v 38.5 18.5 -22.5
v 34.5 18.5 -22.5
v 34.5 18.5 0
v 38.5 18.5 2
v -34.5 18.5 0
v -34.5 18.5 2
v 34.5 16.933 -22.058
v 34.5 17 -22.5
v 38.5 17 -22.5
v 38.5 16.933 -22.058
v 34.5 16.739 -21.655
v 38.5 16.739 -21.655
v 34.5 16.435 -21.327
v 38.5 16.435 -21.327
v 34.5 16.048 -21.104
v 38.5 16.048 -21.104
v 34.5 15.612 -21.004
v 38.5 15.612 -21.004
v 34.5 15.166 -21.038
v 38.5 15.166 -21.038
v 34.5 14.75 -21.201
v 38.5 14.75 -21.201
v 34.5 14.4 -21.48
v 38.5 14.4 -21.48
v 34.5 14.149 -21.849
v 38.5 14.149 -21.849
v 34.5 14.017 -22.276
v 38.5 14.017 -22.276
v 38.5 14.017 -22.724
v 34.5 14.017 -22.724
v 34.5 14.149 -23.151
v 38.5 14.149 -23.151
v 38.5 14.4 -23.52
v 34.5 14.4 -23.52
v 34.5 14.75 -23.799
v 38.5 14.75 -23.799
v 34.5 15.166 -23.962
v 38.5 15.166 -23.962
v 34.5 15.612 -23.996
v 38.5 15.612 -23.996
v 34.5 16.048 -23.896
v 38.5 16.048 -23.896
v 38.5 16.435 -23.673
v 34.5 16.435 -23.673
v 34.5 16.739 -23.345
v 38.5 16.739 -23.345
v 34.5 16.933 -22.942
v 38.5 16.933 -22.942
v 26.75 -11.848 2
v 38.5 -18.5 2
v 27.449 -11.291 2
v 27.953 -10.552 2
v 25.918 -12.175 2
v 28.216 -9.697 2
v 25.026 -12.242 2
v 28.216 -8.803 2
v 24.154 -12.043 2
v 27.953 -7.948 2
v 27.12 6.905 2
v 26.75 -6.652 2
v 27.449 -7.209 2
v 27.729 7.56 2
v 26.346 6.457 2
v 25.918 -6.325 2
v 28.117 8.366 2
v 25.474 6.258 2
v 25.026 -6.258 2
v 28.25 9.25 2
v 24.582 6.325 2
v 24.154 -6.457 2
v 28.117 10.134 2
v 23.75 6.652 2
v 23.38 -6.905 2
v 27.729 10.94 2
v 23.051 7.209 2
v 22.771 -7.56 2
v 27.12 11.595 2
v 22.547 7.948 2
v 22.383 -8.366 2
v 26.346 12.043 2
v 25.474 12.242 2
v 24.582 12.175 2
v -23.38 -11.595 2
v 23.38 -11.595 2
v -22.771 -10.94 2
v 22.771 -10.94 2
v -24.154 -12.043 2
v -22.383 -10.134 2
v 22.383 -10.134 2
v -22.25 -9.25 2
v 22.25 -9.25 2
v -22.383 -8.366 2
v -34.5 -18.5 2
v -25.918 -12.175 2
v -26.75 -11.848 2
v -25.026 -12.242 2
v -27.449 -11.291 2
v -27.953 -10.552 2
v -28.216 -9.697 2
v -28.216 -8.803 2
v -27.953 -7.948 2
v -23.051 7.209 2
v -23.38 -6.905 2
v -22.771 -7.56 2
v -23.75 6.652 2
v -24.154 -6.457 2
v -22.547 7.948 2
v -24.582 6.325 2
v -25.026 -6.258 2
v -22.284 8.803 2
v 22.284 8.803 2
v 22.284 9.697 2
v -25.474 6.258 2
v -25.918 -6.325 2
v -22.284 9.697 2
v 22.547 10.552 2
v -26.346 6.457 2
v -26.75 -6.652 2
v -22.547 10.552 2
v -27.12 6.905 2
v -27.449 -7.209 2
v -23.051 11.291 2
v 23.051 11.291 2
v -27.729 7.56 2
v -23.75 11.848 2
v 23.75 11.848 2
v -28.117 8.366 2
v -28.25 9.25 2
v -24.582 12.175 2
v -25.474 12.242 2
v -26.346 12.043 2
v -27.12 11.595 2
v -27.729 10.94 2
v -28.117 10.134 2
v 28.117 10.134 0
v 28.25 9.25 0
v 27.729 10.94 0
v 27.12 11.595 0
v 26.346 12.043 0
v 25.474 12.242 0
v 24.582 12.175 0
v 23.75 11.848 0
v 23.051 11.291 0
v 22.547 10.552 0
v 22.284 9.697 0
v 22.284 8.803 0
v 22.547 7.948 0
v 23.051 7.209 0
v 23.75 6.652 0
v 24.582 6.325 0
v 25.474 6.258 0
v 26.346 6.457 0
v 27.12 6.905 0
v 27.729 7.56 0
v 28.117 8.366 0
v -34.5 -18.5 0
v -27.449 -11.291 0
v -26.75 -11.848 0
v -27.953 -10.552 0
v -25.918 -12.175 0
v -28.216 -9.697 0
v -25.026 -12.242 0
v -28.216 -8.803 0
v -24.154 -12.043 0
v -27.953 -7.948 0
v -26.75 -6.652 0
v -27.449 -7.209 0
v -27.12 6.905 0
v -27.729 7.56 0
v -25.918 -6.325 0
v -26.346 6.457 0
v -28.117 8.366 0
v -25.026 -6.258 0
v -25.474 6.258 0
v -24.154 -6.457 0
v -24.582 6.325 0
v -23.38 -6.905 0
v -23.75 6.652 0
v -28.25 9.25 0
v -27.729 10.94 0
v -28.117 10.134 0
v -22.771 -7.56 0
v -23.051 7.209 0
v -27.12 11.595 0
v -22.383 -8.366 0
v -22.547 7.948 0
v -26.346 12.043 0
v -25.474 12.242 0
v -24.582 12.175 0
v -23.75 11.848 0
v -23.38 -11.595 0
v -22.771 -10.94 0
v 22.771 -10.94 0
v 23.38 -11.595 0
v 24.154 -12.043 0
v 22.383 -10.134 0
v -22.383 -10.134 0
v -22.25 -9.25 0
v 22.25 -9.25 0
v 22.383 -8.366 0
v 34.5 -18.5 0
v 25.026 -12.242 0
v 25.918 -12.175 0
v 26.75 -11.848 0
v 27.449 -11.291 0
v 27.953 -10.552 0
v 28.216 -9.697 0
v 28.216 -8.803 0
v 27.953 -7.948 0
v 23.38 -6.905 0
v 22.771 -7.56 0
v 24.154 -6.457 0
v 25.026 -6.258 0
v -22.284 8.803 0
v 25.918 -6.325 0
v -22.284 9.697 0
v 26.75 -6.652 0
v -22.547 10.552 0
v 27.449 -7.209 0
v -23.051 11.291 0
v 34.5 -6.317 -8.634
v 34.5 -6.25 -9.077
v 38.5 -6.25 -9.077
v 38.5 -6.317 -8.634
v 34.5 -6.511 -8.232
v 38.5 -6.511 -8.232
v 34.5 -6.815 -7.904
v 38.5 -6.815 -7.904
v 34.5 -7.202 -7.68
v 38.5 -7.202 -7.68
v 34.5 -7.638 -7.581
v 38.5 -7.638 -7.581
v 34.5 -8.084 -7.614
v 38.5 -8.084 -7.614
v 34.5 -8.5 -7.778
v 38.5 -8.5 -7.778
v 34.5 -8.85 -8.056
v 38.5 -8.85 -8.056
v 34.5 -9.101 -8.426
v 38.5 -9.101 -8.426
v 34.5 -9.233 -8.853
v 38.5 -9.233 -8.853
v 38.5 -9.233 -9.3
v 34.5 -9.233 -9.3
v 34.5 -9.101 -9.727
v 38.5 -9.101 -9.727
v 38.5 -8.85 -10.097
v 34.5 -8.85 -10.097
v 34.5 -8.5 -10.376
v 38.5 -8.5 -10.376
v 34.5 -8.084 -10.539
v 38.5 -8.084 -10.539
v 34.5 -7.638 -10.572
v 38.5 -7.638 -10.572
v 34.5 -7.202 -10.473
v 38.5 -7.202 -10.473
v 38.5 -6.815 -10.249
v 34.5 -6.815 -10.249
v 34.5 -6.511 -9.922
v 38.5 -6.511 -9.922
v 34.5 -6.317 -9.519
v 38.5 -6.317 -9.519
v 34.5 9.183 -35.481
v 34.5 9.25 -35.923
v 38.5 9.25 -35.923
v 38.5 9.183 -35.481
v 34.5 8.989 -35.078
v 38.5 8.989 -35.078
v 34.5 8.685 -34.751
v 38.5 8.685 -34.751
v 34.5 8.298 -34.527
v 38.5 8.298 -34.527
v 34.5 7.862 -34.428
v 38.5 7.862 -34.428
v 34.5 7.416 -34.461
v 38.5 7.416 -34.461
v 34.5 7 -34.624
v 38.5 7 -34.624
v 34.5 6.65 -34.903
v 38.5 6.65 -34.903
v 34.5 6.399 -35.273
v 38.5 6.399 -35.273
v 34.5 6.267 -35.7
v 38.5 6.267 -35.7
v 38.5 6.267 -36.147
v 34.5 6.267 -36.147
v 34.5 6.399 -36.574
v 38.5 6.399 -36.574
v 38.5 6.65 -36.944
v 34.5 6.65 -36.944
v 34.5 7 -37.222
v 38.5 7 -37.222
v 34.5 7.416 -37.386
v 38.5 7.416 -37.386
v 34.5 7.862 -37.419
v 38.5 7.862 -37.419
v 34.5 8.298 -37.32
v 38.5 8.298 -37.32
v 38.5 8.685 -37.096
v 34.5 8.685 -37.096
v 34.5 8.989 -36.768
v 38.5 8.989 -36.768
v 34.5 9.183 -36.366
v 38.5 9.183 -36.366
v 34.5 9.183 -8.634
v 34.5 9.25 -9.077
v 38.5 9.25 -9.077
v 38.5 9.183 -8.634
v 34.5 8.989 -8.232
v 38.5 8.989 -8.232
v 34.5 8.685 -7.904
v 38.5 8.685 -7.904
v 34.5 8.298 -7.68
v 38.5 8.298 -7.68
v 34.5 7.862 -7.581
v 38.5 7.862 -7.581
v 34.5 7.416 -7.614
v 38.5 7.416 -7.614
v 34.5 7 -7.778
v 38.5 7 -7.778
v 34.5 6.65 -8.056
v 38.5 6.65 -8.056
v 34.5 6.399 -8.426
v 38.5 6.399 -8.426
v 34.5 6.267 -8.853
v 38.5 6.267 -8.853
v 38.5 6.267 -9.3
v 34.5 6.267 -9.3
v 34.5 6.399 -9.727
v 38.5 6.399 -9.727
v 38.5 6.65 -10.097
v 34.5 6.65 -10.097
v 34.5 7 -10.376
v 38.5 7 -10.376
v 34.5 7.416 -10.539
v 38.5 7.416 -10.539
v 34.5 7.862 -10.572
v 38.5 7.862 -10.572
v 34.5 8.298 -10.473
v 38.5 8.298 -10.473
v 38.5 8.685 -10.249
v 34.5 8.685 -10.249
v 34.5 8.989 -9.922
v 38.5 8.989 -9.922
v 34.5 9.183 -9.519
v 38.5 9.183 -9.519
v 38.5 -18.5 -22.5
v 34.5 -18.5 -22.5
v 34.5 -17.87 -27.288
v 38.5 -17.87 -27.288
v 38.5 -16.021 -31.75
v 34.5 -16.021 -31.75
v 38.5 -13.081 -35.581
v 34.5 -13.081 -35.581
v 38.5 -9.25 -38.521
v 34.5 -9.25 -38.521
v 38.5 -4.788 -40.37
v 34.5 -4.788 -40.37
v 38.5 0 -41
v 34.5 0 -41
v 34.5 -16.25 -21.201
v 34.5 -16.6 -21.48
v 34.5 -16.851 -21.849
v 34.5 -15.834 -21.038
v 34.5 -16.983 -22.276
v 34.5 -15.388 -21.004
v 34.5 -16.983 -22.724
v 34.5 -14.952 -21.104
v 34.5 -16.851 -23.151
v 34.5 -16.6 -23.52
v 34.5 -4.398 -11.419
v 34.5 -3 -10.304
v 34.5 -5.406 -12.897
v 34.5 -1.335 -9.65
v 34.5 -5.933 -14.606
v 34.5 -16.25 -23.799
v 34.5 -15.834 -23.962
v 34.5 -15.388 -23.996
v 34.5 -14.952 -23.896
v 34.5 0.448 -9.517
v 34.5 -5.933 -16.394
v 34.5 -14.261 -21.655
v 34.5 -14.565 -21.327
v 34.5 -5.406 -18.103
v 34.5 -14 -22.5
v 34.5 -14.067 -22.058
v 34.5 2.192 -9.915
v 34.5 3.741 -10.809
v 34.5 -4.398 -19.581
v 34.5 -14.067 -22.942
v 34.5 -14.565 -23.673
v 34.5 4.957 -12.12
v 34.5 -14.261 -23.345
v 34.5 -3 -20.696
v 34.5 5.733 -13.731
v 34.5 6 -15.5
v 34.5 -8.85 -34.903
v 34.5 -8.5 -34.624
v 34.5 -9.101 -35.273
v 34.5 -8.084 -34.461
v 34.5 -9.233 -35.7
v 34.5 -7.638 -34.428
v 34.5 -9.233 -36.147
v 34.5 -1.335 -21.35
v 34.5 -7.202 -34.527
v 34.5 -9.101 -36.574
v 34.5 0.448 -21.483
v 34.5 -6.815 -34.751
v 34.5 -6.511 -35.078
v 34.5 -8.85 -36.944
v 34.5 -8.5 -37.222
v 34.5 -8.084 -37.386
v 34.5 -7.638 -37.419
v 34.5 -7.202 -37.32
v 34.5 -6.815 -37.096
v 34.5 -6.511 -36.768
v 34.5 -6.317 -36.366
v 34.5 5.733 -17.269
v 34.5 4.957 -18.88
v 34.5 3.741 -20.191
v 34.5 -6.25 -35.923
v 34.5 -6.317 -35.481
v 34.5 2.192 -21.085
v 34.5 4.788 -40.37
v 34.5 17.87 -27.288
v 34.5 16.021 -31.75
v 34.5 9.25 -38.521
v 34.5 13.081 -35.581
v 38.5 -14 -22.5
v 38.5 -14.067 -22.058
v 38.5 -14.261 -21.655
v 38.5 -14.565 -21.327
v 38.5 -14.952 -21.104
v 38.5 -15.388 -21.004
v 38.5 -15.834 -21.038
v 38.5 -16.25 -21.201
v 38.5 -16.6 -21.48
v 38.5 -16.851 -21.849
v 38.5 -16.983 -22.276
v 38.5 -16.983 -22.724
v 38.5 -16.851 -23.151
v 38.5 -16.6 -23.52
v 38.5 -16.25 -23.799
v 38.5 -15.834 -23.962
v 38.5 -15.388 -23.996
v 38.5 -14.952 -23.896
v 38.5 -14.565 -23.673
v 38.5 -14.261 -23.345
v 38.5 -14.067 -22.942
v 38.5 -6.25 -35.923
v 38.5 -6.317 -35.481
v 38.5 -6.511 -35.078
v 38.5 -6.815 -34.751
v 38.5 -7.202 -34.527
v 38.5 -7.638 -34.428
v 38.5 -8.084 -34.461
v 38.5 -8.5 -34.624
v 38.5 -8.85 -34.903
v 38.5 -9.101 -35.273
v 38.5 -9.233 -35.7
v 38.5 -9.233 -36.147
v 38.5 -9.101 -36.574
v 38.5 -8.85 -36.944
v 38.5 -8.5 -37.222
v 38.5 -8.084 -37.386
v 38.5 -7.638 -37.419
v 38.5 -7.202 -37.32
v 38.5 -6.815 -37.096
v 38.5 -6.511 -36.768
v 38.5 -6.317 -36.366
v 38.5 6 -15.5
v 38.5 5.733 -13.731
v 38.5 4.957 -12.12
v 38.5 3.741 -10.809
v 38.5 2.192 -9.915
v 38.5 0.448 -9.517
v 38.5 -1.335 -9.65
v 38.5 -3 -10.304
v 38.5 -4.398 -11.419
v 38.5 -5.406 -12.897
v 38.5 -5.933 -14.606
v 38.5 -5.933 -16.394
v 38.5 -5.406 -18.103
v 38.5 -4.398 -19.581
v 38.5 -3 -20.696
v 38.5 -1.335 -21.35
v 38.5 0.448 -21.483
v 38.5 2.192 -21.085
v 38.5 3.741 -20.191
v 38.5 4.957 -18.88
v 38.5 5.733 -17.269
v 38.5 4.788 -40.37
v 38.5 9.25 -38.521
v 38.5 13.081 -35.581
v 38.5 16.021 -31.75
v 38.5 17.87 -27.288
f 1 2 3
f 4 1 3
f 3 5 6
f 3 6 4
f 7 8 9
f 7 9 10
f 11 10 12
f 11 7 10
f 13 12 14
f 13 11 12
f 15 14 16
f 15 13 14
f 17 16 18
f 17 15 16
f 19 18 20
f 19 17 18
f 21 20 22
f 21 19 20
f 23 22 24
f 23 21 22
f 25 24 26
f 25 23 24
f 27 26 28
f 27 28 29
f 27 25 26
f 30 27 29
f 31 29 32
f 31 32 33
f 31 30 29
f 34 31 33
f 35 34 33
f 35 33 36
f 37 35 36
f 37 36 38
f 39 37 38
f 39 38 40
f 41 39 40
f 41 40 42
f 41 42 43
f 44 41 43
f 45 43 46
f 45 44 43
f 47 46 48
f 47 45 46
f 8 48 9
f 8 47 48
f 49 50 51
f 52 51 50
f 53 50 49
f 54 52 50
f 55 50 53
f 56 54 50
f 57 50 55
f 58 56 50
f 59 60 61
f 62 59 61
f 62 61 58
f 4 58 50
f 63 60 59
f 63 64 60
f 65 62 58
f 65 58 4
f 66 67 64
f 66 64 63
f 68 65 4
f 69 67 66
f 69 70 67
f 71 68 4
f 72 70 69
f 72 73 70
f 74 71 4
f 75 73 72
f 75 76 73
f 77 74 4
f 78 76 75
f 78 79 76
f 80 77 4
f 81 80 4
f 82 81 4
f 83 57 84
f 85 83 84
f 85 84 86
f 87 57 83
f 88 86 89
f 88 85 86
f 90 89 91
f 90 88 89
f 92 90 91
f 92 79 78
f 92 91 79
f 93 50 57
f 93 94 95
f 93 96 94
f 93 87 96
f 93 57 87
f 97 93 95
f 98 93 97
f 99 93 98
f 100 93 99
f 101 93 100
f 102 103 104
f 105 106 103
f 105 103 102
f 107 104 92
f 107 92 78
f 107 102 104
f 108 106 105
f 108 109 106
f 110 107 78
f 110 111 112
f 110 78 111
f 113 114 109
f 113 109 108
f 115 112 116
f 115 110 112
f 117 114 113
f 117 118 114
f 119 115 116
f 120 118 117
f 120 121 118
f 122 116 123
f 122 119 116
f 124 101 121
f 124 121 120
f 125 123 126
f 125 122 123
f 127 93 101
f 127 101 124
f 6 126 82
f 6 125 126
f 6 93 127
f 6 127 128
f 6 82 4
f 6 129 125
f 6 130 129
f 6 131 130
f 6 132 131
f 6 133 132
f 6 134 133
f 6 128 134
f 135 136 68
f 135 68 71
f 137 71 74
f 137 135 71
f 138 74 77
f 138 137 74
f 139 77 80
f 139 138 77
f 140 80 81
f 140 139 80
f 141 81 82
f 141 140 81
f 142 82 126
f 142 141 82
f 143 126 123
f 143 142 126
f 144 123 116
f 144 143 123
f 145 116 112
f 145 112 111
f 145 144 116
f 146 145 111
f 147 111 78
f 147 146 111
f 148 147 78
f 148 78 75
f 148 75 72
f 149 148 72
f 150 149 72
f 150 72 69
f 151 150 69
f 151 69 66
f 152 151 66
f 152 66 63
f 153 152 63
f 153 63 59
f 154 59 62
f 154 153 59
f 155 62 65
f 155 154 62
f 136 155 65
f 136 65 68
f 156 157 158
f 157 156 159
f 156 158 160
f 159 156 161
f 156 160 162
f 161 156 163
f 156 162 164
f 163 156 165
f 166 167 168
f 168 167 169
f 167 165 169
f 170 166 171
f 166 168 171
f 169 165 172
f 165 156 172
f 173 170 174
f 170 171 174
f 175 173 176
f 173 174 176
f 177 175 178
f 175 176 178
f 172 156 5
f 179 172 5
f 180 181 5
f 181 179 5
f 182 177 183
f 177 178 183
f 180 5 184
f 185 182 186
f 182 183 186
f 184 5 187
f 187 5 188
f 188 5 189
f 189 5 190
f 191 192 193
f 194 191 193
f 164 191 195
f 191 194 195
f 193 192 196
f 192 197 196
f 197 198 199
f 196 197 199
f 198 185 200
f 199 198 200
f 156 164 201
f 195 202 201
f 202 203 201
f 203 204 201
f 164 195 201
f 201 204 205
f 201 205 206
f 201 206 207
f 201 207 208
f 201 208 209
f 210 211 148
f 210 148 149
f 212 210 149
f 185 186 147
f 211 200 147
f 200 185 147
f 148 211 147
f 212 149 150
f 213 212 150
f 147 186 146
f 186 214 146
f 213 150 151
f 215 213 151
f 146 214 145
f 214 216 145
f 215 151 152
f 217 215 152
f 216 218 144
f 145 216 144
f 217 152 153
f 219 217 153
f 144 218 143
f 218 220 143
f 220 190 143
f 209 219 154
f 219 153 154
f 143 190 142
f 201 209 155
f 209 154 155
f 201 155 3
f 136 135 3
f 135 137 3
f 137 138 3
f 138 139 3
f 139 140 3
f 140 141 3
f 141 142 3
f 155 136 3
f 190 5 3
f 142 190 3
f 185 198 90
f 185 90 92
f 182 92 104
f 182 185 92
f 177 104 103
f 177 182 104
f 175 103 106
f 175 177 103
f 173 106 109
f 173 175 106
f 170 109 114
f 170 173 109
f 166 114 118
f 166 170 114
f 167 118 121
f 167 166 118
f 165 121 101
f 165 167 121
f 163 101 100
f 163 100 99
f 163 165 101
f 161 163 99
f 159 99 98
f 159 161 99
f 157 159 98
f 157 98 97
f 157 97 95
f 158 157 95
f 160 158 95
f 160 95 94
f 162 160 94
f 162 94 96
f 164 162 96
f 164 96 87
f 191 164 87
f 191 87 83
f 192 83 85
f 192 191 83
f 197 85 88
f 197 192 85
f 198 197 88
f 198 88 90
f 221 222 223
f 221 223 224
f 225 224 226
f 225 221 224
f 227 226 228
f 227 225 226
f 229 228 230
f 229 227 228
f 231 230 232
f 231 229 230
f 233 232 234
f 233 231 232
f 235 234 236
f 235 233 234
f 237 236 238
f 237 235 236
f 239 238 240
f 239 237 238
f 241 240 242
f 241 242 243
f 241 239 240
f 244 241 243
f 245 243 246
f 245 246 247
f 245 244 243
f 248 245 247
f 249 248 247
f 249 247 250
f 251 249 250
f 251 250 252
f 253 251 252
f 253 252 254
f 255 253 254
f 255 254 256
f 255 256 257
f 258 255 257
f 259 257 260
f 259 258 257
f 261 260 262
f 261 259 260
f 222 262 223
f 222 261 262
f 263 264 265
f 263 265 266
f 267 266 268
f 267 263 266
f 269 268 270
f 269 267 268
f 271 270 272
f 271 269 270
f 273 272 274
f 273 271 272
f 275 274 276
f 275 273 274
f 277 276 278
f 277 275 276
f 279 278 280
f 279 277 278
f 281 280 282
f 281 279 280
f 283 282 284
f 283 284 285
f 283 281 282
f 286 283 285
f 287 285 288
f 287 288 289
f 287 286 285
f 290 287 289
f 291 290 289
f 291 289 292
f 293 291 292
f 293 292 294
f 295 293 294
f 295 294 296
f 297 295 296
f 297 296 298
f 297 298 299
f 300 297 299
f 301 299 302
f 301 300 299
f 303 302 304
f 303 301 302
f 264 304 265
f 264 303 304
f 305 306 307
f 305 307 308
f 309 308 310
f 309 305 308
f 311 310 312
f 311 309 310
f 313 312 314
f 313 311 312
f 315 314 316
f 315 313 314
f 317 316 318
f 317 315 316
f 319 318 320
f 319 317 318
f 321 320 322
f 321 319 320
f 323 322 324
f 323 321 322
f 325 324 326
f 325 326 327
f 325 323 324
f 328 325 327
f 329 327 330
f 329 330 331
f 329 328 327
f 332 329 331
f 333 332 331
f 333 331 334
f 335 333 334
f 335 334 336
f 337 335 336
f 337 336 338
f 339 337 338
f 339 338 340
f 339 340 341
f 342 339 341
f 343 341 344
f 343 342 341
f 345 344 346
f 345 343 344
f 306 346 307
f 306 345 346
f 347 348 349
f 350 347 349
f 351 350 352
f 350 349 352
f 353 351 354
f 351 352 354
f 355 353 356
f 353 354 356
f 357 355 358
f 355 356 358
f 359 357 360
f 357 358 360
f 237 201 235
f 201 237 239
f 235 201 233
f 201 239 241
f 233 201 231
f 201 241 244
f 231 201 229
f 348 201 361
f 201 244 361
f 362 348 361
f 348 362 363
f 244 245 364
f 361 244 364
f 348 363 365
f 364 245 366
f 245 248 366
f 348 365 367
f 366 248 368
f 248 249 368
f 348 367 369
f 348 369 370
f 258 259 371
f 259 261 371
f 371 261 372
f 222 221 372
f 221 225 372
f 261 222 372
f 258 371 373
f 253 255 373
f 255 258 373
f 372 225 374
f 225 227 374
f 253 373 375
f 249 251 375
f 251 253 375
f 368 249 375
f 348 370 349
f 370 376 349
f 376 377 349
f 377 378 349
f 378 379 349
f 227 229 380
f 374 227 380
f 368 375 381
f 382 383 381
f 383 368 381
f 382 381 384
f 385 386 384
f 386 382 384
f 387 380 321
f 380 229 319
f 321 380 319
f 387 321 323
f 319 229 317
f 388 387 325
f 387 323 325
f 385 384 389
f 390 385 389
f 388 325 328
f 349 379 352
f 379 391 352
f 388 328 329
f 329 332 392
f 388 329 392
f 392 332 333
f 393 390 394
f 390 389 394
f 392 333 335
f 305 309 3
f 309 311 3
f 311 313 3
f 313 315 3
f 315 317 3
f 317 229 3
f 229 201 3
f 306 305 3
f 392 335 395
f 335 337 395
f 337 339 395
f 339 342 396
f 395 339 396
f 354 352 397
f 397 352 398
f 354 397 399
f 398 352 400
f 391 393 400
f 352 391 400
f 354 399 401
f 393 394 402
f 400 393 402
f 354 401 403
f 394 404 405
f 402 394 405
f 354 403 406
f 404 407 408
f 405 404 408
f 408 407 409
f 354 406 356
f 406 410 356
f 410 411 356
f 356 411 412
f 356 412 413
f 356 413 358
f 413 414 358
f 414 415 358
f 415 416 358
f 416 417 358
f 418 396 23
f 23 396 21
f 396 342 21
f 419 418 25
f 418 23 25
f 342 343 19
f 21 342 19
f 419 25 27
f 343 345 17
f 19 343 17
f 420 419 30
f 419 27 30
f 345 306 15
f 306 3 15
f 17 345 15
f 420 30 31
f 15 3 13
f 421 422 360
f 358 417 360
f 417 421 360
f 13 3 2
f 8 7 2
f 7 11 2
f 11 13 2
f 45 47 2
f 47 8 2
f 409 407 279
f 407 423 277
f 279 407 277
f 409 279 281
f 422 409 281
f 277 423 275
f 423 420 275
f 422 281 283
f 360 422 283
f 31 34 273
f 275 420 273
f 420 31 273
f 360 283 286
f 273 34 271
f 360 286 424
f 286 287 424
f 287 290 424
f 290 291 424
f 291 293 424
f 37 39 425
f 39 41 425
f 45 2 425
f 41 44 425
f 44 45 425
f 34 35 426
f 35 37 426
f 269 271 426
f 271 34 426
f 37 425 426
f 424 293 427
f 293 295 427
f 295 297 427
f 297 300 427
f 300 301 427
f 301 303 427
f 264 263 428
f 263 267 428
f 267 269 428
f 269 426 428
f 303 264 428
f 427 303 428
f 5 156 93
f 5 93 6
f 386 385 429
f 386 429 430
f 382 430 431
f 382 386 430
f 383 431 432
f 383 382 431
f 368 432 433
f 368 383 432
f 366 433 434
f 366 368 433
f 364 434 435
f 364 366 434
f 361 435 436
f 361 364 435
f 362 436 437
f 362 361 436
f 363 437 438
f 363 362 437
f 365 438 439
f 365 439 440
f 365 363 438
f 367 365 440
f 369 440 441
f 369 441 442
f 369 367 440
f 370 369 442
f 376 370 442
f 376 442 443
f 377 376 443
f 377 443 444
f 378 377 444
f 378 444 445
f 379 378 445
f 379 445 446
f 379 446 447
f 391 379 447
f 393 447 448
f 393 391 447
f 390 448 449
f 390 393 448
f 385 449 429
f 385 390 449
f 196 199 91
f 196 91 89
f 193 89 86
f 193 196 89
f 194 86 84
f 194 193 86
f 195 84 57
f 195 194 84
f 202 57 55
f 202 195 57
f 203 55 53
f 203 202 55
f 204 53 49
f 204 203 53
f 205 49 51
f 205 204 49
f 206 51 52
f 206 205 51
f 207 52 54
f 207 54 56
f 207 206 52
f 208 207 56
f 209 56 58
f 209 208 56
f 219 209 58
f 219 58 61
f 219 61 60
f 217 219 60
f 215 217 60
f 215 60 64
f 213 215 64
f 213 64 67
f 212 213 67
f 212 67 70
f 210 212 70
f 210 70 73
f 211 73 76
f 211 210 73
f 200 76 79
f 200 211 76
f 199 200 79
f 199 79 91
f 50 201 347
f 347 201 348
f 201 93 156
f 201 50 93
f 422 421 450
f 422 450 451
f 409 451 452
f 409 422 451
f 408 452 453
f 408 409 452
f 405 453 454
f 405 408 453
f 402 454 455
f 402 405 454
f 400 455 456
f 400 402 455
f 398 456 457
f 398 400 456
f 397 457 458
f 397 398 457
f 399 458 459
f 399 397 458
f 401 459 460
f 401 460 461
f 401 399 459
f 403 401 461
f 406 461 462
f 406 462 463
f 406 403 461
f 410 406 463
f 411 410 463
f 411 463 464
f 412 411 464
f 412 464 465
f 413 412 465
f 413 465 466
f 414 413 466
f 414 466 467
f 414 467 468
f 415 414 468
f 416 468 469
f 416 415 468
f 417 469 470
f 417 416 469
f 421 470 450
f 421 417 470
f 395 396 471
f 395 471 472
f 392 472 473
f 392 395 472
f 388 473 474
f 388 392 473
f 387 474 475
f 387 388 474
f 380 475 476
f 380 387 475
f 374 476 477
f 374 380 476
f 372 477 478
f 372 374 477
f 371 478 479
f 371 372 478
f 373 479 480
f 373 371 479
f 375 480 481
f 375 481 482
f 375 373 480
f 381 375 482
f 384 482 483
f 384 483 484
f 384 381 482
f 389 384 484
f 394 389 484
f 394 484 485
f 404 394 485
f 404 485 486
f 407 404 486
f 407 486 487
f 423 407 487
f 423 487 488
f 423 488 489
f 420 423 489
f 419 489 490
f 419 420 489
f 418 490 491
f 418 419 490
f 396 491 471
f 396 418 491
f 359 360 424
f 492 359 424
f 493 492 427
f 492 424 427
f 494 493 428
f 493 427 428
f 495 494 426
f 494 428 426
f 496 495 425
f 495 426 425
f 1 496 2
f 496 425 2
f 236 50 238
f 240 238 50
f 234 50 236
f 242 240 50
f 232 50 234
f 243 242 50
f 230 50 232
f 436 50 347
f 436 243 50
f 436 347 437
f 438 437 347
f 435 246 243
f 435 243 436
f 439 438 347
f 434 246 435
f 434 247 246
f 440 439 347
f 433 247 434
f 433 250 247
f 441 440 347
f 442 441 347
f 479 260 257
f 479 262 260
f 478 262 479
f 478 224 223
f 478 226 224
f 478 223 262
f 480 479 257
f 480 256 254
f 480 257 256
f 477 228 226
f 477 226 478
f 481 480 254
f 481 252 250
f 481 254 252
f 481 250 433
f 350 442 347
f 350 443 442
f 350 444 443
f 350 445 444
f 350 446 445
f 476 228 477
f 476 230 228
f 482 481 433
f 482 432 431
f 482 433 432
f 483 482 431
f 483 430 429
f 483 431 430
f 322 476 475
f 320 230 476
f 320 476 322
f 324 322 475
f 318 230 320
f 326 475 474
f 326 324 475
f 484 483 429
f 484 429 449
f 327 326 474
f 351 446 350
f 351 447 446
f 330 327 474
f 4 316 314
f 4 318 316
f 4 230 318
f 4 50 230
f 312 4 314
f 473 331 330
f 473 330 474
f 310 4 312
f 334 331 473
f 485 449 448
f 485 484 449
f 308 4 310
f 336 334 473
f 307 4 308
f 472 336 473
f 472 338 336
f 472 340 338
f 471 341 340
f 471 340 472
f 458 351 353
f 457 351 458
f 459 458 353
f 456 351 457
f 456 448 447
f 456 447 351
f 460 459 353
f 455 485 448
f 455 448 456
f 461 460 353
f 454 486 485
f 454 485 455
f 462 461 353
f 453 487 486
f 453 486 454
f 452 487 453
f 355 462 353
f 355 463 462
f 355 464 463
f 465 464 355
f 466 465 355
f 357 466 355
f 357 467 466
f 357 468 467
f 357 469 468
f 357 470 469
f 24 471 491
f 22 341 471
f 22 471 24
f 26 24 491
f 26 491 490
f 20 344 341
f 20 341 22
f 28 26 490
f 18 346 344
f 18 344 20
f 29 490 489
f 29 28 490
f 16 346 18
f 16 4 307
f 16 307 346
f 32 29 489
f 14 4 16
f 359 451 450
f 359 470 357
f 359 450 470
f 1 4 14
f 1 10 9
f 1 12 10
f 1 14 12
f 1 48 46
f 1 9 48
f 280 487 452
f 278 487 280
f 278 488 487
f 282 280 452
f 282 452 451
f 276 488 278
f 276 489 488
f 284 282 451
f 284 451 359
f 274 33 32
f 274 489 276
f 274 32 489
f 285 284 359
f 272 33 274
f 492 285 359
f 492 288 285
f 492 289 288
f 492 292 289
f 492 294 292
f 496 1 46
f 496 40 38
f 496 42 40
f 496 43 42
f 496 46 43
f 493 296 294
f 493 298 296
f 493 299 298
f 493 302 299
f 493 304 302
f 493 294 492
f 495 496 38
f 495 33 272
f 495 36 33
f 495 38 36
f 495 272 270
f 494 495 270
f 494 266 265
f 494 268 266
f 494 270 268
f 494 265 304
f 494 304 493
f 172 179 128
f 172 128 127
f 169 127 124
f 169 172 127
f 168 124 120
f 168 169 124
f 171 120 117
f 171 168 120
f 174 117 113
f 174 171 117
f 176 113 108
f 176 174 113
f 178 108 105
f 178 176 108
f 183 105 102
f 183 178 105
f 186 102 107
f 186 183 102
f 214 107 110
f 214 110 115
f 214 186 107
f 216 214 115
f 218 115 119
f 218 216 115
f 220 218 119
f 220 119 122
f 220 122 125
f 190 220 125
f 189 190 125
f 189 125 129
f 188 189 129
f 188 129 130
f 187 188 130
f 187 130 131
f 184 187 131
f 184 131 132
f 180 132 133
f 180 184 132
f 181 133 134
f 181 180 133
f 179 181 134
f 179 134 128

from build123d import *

# Parameters (mm, degrees)
SKETCH_2_W      = 69
SKETCH_2_H      = 37
SKETCH_2_R      = 3
EXTRUDE_1_DEPTH = 2
SKETCH_3_W      = 2
SKETCH_3_H      = 37
SKETCH_3_R      = 1.5
SKETCH_3_R_2    = 6
EXTRUDE_2_DEPTH = 4


with BuildPart() as part:
    # 草图2 → 凸台-拉伸1 (new body)
    with BuildSketch(Plane.XY):
        Rectangle(SKETCH_2_W, SKETCH_2_H)
        with Locations((25.25, 9.25)):
            Circle(SKETCH_2_R, mode=Mode.SUBTRACT)
        with Locations(Location((25.25, -9.25, 0), (0, 0, 180))):
            Circle(SKETCH_2_R, mode=Mode.SUBTRACT)
        with Locations(Location((-25.25, 9.25, 0), (0, 0, 180))):
            Circle(SKETCH_2_R, mode=Mode.SUBTRACT)
        with Locations((-25.25, -9.25)):
            Circle(SKETCH_2_R, mode=Mode.SUBTRACT)
    extrude(amount=EXTRUDE_1_DEPTH)

    # 草图3 → 凸台-拉伸2 (add)
    # profile 1 of 3: a face of its own
    with BuildSketch(Plane(origin=(34.5, 0, 0), x_dir=(0, 0, -1), z_dir=(1, 0, 0))):
        with BuildLine():
            ThreePointArc((22.5, -18.5), (4, 0), (22.5, 18.5))
            Line((22.5, 18.5), (0, 18.5))
            Line((0, 18.5), (0, -18.5))
            Line((0, -18.5), (22.5, -18.5))
        make_face()
    # profile 2 of 3: a face of its own
    with BuildSketch(Plane(origin=(34.5, 0, 0), x_dir=(0, 0, -1), z_dir=(1, 0, 0))):
        with Locations((-1, 0)):
            Rectangle(SKETCH_3_W, SKETCH_3_H)
    # profile 3 of 3: a face of its own
    with BuildSketch(Plane(origin=(34.5, 0, 0), x_dir=(0, 0, -1), z_dir=(1, 0, 0))):
        with BuildLine():
            ThreePointArc((41, 0), (35.581475452, 13.081475452), (22.5, 18.5))
            ThreePointArc((22.5, 18.5), (4, 0), (22.5, -18.5))
            ThreePointArc((22.5, -18.5), (35.581475452, -13.081475452), (41, 0))
        make_face()
        with Locations(Location((9.076606241, -7.75, 0), (0, 0, 90))):
            Circle(SKETCH_3_R, mode=Mode.SUBTRACT)
        with Locations(Location((22.5, -15.5, 0), (0, 0, 90))):
            Circle(SKETCH_3_R, mode=Mode.SUBTRACT)
        with Locations(Location((35.923393759, -7.75, 0), (0, 0, 90))):
            Circle(SKETCH_3_R, mode=Mode.SUBTRACT)
        with Locations(Location((15.5, 0, 0), (0, 0, 90))):
            Circle(SKETCH_3_R_2, mode=Mode.SUBTRACT)
        with Locations(Location((9.076606241, 7.75, 0), (0, 0, 90))):
            Circle(SKETCH_3_R, mode=Mode.SUBTRACT)
        with Locations(Location((35.923393759, 7.75, 0), (0, 0, 90))):
            Circle(SKETCH_3_R, mode=Mode.SUBTRACT)
        with Locations(Location((22.5, 15.5, 0), (0, 0, 90))):
            Circle(SKETCH_3_R, mode=Mode.SUBTRACT)
    extrude(amount=EXTRUDE_2_DEPTH)


solid = part.part
